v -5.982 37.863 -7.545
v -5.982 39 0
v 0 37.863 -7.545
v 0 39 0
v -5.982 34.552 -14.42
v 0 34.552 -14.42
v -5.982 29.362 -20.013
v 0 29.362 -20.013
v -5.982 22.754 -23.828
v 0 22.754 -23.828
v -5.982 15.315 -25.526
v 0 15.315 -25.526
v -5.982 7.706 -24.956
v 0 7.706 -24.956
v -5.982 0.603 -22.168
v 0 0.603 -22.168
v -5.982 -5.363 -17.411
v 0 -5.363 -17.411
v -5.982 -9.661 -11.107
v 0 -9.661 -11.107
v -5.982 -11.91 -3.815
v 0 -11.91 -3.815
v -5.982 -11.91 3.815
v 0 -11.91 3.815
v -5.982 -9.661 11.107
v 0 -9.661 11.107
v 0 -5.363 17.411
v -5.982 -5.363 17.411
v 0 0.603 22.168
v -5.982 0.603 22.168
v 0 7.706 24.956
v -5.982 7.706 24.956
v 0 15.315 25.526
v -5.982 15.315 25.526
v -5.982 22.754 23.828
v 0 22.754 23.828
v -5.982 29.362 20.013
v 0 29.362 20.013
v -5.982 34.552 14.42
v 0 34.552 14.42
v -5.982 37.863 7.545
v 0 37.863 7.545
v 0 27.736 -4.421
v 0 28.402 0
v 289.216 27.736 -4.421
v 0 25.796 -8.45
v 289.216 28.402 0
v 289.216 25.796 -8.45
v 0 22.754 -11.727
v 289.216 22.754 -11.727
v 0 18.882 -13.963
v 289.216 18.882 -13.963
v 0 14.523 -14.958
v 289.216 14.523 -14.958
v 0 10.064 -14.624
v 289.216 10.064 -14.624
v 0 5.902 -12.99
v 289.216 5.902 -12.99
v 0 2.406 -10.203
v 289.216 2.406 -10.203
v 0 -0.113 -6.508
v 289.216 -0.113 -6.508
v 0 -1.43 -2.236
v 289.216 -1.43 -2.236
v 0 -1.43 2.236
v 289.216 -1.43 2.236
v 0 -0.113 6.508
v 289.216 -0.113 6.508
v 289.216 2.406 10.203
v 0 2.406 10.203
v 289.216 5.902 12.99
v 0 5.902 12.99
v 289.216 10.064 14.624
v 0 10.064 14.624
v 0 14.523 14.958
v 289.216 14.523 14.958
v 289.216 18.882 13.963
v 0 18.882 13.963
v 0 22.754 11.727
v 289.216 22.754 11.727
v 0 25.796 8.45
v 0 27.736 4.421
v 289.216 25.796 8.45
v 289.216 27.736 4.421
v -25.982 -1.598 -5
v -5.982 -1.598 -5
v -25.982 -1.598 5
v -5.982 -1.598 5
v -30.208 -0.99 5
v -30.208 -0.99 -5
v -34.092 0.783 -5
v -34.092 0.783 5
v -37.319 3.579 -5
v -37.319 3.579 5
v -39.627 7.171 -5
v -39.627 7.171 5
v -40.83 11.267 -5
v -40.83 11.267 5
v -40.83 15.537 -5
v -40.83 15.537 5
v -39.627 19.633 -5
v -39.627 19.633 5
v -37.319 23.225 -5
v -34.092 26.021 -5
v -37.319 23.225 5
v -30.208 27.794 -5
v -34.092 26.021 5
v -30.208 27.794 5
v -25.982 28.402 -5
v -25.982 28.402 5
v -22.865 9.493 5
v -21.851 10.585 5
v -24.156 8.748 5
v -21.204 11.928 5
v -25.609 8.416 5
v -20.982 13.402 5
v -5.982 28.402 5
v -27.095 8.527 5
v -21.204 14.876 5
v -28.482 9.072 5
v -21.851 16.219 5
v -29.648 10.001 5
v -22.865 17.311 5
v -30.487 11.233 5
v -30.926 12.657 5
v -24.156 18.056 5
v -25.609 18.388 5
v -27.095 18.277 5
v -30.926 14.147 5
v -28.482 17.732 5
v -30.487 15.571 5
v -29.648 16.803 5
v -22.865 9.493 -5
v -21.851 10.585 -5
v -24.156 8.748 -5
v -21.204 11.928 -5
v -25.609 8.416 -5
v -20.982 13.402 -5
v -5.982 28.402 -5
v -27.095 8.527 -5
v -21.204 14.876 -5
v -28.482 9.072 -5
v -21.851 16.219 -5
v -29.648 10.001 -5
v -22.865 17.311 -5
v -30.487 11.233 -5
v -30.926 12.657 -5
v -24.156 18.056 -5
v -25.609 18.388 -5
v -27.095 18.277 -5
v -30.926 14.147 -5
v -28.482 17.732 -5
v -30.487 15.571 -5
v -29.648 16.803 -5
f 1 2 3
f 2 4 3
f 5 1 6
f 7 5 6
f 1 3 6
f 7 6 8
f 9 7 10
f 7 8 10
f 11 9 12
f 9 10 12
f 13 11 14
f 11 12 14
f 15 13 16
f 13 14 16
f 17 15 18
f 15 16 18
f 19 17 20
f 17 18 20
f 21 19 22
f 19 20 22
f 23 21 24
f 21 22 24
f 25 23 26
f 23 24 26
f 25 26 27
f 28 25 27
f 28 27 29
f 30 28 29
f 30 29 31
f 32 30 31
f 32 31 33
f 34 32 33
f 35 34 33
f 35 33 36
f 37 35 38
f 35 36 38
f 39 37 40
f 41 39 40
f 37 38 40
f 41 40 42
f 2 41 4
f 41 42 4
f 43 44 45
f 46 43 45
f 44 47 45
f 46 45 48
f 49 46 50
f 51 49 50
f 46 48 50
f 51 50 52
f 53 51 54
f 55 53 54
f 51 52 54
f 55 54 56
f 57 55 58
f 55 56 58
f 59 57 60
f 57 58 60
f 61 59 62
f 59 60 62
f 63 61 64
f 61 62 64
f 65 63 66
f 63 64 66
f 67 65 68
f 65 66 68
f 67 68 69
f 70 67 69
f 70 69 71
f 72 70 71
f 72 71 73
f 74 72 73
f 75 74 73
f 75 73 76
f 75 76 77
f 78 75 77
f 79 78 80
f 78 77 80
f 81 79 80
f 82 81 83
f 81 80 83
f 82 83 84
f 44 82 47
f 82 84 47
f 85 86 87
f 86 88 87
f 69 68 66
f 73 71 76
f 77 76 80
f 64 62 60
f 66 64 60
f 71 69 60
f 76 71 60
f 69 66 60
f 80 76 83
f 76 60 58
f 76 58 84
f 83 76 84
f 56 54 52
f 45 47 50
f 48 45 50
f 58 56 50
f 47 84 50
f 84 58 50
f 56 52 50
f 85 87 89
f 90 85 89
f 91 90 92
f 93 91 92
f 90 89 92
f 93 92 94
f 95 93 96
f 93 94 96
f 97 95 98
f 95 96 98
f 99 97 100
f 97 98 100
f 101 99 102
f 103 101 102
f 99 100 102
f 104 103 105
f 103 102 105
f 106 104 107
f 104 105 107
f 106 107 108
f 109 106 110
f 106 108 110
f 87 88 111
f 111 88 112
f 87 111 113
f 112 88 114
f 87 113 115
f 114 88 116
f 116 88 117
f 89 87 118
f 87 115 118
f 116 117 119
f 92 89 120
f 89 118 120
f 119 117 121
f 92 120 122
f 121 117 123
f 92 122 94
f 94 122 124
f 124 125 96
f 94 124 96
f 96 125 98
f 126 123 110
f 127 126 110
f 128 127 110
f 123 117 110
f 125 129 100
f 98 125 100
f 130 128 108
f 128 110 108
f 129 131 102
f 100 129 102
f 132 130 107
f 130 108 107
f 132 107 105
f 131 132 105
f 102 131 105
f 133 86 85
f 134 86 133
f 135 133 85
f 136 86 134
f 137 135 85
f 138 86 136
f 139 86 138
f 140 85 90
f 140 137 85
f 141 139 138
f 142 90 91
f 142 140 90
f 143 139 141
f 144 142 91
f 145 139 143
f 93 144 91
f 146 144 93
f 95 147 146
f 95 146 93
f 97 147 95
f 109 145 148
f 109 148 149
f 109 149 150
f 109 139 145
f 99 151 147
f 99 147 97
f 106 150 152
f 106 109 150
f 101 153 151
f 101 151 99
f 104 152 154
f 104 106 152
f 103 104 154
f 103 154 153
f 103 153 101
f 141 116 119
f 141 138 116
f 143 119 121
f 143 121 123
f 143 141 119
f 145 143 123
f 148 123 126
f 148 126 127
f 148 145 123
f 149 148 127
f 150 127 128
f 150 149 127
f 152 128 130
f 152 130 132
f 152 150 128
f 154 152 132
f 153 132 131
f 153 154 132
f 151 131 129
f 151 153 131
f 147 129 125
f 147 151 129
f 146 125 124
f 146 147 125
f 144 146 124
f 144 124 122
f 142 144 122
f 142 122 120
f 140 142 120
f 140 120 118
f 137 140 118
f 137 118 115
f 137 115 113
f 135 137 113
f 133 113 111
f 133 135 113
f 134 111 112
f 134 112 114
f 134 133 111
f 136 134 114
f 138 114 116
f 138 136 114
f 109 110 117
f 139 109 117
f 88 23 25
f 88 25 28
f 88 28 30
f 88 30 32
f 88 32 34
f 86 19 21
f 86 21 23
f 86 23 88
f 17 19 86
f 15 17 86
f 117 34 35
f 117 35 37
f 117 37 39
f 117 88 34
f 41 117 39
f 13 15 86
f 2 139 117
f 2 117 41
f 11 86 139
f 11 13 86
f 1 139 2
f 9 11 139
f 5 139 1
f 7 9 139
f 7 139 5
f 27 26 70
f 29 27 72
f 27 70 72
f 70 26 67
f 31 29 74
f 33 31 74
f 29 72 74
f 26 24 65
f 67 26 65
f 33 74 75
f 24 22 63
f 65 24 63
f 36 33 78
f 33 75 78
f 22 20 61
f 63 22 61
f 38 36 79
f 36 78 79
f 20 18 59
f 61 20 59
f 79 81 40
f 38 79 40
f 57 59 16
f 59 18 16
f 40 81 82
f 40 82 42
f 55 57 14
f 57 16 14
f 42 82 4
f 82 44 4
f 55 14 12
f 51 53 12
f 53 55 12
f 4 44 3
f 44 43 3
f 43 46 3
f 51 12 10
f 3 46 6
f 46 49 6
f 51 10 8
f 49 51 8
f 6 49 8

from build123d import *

# Parameters (mm, degrees)
SKETCH2_R           = 5
BOSS_EXTRUDE1_DEPTH = 5


with BuildPart() as part:
    # Sketch2 → Boss-Extrude1 (new, symmetric)
    with BuildSketch(Plane.XY):
        with BuildLine():
            Line((-25.982341551, 28.402024397), (-5.982341551, 28.402024397))
            Line((-5.982341551, 28.402024397), (-5.982341551, -1.597975603))
            Line((-5.982341551, -1.597975603), (-25.982341551, -1.597975603))
            ThreePointArc((-25.982341551, -1.597975603), (-40.982341551, 13.402024397), (-25.982341551, 28.402024397))
        make_face()
        with Locations((-25.982341551, 13.402024397)):
            Circle(SKETCH2_R, mode=Mode.SUBTRACT)
    extrude(amount=BOSS_EXTRUDE1_DEPTH, both=True)

    # Sketch8 → Revolve1 (revolve)
    with BuildSketch(Plane.XY):
        Polygon((-5.982341551, 28.402024397), (-5.982341551, 39), (0, 39), (0, 28.402024397), (289.215653405, 28.402024397), (289.215653405, 13.402024397), (-5.982341551, 13.402024397), align=None)
    revolve(axis=Axis((289.215653405, 13.402024397, 0), (-1, 0, 0)))


solid = part.part
